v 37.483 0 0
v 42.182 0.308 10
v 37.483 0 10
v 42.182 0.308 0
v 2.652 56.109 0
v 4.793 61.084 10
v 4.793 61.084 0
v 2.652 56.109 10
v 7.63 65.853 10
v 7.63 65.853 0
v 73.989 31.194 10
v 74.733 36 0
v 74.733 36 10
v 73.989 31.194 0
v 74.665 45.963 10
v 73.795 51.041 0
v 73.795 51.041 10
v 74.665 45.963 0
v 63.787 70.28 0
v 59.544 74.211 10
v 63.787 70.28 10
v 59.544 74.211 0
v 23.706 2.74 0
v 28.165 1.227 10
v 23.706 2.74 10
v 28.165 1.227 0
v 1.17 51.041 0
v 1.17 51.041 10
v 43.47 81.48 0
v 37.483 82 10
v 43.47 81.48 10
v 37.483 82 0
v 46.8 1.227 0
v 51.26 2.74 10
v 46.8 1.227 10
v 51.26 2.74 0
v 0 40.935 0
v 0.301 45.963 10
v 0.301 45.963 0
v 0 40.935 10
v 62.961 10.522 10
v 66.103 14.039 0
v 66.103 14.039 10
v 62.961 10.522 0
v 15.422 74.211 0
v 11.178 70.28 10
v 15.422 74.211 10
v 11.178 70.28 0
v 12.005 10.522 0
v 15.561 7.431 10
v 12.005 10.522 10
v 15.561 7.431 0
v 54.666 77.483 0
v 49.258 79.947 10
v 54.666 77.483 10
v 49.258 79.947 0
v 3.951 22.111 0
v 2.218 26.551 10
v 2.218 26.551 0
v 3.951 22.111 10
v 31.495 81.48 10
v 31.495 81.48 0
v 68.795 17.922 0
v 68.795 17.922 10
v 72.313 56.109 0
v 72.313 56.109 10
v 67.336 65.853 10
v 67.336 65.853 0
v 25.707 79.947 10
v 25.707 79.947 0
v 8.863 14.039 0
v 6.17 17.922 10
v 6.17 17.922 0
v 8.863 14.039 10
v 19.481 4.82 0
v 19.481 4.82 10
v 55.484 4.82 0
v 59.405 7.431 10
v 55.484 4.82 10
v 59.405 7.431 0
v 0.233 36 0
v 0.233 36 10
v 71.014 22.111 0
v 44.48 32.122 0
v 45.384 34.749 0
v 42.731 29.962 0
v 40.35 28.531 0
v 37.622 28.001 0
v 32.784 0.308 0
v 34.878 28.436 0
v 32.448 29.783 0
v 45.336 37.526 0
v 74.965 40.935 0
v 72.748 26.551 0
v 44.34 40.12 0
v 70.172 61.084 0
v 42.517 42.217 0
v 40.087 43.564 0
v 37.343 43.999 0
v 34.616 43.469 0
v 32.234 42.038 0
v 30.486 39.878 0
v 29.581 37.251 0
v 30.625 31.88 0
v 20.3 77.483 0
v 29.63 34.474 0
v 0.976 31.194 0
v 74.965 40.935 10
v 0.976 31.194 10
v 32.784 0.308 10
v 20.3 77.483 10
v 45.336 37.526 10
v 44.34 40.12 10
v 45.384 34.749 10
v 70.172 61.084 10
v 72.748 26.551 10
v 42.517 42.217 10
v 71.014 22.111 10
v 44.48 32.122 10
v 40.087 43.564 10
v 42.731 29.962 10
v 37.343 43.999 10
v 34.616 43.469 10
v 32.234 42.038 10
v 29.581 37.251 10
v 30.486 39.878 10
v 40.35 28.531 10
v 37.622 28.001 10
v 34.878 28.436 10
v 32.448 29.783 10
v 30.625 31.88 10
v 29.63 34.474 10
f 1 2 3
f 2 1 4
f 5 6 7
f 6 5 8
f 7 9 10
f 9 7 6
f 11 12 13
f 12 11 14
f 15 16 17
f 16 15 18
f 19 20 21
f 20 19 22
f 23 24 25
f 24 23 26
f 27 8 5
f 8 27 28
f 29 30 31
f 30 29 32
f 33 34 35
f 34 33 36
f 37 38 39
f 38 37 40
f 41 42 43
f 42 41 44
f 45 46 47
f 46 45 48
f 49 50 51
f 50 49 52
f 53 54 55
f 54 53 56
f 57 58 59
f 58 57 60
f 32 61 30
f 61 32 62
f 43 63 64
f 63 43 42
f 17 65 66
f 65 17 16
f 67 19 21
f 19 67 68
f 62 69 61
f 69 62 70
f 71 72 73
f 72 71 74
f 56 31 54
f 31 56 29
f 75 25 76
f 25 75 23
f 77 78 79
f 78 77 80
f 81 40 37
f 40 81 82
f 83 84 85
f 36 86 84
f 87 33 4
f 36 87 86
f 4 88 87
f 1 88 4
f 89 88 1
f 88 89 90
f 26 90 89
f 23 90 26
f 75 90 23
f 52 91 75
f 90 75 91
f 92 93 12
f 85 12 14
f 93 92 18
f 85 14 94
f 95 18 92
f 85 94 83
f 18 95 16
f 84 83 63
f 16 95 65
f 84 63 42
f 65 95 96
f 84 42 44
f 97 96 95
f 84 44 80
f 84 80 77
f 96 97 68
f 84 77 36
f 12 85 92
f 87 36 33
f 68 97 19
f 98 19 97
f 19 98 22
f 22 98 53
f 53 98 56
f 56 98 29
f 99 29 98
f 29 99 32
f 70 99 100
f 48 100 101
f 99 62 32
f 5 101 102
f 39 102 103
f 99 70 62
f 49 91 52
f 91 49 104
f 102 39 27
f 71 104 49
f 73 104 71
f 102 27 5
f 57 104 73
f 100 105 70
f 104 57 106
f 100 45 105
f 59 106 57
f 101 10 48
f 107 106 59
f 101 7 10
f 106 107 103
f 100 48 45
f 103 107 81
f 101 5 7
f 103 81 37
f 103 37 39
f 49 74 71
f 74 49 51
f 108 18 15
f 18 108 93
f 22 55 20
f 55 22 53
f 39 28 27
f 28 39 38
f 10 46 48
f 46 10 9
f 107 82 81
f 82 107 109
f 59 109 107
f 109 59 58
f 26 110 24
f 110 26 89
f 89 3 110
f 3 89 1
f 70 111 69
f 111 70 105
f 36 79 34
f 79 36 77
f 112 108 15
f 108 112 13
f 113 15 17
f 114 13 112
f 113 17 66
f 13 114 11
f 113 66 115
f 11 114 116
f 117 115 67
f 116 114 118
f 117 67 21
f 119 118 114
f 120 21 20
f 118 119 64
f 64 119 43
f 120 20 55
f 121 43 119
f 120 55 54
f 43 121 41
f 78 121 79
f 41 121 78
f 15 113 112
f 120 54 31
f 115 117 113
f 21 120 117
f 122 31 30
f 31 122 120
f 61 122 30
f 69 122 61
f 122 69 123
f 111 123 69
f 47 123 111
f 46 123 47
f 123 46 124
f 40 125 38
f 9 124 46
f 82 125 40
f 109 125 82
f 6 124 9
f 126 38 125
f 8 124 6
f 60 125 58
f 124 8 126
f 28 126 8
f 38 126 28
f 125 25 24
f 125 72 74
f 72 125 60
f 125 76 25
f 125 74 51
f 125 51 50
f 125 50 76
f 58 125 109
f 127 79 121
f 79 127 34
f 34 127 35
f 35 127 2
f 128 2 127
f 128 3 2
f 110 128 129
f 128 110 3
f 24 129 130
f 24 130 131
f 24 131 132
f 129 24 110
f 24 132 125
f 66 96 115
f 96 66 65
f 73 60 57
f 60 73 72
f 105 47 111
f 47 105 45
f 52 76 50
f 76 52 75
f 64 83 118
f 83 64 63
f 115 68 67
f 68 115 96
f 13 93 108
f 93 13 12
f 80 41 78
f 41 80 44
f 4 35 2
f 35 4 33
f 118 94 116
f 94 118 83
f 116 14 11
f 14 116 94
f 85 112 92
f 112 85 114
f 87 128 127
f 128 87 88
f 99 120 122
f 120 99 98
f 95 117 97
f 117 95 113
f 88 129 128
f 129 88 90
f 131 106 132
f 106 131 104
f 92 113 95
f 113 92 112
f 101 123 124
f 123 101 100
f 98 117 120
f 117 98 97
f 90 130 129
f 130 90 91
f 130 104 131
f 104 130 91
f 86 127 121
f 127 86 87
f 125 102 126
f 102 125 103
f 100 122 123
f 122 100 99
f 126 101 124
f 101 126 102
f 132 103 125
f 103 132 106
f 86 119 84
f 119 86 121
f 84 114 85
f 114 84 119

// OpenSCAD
$fn = 32;

// ----------------------------------------------------------------------
// Cam plate: single_lobe cam, base R36
// ----------------------------------------------------------------------

// --- parameters (mm) ---
base_r = 36;              // base circle radius
lobe_h = 10;              // cam lobe rise
bore_r = 8;               // shaft bore radius
plate_t = 10;             // plate thickness, Z (extrusion height)

profile = [[74.733, 36], [74.965, 40.935], [74.665, 45.963], [73.795, 51.041], [72.313, 56.109], [70.172, 61.084], [67.336, 65.853], [63.787, 70.28], [59.544, 74.211], [54.666, 77.483], [49.258, 79.947], [43.47, 81.48], [37.483, 82], [31.495, 81.48], [25.707, 79.947], [20.3, 77.483], [15.422, 74.211], [11.178, 70.28], [7.63, 65.853], [4.793, 61.084], [2.652, 56.109], [1.17, 51.041], [0.301, 45.963], [0, 40.935], [0.233, 36], [0.976, 31.194], [2.218, 26.551], [3.951, 22.111], [6.17, 17.922], [8.863, 14.039], [12.005, 10.522], [15.561, 7.431], [19.481, 4.82], [23.706, 2.74], [28.165, 1.227], [32.784, 0.308], [37.483, 0], [42.182, 0.308], [46.8, 1.227], [51.26, 2.74], [55.484, 4.82], [59.405, 7.431], [62.961, 10.522], [66.103, 14.039], [68.795, 17.922], [71.014, 22.111], [72.748, 26.551], [73.989, 31.194]];  // primary outline, 48 points, counter clockwise
void_1 = [[45.336, 37.526], [44.34, 40.12], [42.517, 42.217], [40.087, 43.564], [37.343, 43.999], [34.616, 43.469], [32.234, 42.038], [30.486, 39.878], [29.581, 37.251], [29.63, 34.474], [30.625, 31.88], [32.448, 29.783], [34.878, 28.436], [37.622, 28.001], [40.35, 28.531], [42.731, 29.962], [44.48, 32.122], [45.384, 34.749]];  // shaft bore, 18 points

// --- the one profile operation ---
difference() {
  linear_extrude(height = plate_t) polygon(points = profile);
  translate([0, 0, -1])
    linear_extrude(height = plate_t + 2) polygon(points = void_1);
}
